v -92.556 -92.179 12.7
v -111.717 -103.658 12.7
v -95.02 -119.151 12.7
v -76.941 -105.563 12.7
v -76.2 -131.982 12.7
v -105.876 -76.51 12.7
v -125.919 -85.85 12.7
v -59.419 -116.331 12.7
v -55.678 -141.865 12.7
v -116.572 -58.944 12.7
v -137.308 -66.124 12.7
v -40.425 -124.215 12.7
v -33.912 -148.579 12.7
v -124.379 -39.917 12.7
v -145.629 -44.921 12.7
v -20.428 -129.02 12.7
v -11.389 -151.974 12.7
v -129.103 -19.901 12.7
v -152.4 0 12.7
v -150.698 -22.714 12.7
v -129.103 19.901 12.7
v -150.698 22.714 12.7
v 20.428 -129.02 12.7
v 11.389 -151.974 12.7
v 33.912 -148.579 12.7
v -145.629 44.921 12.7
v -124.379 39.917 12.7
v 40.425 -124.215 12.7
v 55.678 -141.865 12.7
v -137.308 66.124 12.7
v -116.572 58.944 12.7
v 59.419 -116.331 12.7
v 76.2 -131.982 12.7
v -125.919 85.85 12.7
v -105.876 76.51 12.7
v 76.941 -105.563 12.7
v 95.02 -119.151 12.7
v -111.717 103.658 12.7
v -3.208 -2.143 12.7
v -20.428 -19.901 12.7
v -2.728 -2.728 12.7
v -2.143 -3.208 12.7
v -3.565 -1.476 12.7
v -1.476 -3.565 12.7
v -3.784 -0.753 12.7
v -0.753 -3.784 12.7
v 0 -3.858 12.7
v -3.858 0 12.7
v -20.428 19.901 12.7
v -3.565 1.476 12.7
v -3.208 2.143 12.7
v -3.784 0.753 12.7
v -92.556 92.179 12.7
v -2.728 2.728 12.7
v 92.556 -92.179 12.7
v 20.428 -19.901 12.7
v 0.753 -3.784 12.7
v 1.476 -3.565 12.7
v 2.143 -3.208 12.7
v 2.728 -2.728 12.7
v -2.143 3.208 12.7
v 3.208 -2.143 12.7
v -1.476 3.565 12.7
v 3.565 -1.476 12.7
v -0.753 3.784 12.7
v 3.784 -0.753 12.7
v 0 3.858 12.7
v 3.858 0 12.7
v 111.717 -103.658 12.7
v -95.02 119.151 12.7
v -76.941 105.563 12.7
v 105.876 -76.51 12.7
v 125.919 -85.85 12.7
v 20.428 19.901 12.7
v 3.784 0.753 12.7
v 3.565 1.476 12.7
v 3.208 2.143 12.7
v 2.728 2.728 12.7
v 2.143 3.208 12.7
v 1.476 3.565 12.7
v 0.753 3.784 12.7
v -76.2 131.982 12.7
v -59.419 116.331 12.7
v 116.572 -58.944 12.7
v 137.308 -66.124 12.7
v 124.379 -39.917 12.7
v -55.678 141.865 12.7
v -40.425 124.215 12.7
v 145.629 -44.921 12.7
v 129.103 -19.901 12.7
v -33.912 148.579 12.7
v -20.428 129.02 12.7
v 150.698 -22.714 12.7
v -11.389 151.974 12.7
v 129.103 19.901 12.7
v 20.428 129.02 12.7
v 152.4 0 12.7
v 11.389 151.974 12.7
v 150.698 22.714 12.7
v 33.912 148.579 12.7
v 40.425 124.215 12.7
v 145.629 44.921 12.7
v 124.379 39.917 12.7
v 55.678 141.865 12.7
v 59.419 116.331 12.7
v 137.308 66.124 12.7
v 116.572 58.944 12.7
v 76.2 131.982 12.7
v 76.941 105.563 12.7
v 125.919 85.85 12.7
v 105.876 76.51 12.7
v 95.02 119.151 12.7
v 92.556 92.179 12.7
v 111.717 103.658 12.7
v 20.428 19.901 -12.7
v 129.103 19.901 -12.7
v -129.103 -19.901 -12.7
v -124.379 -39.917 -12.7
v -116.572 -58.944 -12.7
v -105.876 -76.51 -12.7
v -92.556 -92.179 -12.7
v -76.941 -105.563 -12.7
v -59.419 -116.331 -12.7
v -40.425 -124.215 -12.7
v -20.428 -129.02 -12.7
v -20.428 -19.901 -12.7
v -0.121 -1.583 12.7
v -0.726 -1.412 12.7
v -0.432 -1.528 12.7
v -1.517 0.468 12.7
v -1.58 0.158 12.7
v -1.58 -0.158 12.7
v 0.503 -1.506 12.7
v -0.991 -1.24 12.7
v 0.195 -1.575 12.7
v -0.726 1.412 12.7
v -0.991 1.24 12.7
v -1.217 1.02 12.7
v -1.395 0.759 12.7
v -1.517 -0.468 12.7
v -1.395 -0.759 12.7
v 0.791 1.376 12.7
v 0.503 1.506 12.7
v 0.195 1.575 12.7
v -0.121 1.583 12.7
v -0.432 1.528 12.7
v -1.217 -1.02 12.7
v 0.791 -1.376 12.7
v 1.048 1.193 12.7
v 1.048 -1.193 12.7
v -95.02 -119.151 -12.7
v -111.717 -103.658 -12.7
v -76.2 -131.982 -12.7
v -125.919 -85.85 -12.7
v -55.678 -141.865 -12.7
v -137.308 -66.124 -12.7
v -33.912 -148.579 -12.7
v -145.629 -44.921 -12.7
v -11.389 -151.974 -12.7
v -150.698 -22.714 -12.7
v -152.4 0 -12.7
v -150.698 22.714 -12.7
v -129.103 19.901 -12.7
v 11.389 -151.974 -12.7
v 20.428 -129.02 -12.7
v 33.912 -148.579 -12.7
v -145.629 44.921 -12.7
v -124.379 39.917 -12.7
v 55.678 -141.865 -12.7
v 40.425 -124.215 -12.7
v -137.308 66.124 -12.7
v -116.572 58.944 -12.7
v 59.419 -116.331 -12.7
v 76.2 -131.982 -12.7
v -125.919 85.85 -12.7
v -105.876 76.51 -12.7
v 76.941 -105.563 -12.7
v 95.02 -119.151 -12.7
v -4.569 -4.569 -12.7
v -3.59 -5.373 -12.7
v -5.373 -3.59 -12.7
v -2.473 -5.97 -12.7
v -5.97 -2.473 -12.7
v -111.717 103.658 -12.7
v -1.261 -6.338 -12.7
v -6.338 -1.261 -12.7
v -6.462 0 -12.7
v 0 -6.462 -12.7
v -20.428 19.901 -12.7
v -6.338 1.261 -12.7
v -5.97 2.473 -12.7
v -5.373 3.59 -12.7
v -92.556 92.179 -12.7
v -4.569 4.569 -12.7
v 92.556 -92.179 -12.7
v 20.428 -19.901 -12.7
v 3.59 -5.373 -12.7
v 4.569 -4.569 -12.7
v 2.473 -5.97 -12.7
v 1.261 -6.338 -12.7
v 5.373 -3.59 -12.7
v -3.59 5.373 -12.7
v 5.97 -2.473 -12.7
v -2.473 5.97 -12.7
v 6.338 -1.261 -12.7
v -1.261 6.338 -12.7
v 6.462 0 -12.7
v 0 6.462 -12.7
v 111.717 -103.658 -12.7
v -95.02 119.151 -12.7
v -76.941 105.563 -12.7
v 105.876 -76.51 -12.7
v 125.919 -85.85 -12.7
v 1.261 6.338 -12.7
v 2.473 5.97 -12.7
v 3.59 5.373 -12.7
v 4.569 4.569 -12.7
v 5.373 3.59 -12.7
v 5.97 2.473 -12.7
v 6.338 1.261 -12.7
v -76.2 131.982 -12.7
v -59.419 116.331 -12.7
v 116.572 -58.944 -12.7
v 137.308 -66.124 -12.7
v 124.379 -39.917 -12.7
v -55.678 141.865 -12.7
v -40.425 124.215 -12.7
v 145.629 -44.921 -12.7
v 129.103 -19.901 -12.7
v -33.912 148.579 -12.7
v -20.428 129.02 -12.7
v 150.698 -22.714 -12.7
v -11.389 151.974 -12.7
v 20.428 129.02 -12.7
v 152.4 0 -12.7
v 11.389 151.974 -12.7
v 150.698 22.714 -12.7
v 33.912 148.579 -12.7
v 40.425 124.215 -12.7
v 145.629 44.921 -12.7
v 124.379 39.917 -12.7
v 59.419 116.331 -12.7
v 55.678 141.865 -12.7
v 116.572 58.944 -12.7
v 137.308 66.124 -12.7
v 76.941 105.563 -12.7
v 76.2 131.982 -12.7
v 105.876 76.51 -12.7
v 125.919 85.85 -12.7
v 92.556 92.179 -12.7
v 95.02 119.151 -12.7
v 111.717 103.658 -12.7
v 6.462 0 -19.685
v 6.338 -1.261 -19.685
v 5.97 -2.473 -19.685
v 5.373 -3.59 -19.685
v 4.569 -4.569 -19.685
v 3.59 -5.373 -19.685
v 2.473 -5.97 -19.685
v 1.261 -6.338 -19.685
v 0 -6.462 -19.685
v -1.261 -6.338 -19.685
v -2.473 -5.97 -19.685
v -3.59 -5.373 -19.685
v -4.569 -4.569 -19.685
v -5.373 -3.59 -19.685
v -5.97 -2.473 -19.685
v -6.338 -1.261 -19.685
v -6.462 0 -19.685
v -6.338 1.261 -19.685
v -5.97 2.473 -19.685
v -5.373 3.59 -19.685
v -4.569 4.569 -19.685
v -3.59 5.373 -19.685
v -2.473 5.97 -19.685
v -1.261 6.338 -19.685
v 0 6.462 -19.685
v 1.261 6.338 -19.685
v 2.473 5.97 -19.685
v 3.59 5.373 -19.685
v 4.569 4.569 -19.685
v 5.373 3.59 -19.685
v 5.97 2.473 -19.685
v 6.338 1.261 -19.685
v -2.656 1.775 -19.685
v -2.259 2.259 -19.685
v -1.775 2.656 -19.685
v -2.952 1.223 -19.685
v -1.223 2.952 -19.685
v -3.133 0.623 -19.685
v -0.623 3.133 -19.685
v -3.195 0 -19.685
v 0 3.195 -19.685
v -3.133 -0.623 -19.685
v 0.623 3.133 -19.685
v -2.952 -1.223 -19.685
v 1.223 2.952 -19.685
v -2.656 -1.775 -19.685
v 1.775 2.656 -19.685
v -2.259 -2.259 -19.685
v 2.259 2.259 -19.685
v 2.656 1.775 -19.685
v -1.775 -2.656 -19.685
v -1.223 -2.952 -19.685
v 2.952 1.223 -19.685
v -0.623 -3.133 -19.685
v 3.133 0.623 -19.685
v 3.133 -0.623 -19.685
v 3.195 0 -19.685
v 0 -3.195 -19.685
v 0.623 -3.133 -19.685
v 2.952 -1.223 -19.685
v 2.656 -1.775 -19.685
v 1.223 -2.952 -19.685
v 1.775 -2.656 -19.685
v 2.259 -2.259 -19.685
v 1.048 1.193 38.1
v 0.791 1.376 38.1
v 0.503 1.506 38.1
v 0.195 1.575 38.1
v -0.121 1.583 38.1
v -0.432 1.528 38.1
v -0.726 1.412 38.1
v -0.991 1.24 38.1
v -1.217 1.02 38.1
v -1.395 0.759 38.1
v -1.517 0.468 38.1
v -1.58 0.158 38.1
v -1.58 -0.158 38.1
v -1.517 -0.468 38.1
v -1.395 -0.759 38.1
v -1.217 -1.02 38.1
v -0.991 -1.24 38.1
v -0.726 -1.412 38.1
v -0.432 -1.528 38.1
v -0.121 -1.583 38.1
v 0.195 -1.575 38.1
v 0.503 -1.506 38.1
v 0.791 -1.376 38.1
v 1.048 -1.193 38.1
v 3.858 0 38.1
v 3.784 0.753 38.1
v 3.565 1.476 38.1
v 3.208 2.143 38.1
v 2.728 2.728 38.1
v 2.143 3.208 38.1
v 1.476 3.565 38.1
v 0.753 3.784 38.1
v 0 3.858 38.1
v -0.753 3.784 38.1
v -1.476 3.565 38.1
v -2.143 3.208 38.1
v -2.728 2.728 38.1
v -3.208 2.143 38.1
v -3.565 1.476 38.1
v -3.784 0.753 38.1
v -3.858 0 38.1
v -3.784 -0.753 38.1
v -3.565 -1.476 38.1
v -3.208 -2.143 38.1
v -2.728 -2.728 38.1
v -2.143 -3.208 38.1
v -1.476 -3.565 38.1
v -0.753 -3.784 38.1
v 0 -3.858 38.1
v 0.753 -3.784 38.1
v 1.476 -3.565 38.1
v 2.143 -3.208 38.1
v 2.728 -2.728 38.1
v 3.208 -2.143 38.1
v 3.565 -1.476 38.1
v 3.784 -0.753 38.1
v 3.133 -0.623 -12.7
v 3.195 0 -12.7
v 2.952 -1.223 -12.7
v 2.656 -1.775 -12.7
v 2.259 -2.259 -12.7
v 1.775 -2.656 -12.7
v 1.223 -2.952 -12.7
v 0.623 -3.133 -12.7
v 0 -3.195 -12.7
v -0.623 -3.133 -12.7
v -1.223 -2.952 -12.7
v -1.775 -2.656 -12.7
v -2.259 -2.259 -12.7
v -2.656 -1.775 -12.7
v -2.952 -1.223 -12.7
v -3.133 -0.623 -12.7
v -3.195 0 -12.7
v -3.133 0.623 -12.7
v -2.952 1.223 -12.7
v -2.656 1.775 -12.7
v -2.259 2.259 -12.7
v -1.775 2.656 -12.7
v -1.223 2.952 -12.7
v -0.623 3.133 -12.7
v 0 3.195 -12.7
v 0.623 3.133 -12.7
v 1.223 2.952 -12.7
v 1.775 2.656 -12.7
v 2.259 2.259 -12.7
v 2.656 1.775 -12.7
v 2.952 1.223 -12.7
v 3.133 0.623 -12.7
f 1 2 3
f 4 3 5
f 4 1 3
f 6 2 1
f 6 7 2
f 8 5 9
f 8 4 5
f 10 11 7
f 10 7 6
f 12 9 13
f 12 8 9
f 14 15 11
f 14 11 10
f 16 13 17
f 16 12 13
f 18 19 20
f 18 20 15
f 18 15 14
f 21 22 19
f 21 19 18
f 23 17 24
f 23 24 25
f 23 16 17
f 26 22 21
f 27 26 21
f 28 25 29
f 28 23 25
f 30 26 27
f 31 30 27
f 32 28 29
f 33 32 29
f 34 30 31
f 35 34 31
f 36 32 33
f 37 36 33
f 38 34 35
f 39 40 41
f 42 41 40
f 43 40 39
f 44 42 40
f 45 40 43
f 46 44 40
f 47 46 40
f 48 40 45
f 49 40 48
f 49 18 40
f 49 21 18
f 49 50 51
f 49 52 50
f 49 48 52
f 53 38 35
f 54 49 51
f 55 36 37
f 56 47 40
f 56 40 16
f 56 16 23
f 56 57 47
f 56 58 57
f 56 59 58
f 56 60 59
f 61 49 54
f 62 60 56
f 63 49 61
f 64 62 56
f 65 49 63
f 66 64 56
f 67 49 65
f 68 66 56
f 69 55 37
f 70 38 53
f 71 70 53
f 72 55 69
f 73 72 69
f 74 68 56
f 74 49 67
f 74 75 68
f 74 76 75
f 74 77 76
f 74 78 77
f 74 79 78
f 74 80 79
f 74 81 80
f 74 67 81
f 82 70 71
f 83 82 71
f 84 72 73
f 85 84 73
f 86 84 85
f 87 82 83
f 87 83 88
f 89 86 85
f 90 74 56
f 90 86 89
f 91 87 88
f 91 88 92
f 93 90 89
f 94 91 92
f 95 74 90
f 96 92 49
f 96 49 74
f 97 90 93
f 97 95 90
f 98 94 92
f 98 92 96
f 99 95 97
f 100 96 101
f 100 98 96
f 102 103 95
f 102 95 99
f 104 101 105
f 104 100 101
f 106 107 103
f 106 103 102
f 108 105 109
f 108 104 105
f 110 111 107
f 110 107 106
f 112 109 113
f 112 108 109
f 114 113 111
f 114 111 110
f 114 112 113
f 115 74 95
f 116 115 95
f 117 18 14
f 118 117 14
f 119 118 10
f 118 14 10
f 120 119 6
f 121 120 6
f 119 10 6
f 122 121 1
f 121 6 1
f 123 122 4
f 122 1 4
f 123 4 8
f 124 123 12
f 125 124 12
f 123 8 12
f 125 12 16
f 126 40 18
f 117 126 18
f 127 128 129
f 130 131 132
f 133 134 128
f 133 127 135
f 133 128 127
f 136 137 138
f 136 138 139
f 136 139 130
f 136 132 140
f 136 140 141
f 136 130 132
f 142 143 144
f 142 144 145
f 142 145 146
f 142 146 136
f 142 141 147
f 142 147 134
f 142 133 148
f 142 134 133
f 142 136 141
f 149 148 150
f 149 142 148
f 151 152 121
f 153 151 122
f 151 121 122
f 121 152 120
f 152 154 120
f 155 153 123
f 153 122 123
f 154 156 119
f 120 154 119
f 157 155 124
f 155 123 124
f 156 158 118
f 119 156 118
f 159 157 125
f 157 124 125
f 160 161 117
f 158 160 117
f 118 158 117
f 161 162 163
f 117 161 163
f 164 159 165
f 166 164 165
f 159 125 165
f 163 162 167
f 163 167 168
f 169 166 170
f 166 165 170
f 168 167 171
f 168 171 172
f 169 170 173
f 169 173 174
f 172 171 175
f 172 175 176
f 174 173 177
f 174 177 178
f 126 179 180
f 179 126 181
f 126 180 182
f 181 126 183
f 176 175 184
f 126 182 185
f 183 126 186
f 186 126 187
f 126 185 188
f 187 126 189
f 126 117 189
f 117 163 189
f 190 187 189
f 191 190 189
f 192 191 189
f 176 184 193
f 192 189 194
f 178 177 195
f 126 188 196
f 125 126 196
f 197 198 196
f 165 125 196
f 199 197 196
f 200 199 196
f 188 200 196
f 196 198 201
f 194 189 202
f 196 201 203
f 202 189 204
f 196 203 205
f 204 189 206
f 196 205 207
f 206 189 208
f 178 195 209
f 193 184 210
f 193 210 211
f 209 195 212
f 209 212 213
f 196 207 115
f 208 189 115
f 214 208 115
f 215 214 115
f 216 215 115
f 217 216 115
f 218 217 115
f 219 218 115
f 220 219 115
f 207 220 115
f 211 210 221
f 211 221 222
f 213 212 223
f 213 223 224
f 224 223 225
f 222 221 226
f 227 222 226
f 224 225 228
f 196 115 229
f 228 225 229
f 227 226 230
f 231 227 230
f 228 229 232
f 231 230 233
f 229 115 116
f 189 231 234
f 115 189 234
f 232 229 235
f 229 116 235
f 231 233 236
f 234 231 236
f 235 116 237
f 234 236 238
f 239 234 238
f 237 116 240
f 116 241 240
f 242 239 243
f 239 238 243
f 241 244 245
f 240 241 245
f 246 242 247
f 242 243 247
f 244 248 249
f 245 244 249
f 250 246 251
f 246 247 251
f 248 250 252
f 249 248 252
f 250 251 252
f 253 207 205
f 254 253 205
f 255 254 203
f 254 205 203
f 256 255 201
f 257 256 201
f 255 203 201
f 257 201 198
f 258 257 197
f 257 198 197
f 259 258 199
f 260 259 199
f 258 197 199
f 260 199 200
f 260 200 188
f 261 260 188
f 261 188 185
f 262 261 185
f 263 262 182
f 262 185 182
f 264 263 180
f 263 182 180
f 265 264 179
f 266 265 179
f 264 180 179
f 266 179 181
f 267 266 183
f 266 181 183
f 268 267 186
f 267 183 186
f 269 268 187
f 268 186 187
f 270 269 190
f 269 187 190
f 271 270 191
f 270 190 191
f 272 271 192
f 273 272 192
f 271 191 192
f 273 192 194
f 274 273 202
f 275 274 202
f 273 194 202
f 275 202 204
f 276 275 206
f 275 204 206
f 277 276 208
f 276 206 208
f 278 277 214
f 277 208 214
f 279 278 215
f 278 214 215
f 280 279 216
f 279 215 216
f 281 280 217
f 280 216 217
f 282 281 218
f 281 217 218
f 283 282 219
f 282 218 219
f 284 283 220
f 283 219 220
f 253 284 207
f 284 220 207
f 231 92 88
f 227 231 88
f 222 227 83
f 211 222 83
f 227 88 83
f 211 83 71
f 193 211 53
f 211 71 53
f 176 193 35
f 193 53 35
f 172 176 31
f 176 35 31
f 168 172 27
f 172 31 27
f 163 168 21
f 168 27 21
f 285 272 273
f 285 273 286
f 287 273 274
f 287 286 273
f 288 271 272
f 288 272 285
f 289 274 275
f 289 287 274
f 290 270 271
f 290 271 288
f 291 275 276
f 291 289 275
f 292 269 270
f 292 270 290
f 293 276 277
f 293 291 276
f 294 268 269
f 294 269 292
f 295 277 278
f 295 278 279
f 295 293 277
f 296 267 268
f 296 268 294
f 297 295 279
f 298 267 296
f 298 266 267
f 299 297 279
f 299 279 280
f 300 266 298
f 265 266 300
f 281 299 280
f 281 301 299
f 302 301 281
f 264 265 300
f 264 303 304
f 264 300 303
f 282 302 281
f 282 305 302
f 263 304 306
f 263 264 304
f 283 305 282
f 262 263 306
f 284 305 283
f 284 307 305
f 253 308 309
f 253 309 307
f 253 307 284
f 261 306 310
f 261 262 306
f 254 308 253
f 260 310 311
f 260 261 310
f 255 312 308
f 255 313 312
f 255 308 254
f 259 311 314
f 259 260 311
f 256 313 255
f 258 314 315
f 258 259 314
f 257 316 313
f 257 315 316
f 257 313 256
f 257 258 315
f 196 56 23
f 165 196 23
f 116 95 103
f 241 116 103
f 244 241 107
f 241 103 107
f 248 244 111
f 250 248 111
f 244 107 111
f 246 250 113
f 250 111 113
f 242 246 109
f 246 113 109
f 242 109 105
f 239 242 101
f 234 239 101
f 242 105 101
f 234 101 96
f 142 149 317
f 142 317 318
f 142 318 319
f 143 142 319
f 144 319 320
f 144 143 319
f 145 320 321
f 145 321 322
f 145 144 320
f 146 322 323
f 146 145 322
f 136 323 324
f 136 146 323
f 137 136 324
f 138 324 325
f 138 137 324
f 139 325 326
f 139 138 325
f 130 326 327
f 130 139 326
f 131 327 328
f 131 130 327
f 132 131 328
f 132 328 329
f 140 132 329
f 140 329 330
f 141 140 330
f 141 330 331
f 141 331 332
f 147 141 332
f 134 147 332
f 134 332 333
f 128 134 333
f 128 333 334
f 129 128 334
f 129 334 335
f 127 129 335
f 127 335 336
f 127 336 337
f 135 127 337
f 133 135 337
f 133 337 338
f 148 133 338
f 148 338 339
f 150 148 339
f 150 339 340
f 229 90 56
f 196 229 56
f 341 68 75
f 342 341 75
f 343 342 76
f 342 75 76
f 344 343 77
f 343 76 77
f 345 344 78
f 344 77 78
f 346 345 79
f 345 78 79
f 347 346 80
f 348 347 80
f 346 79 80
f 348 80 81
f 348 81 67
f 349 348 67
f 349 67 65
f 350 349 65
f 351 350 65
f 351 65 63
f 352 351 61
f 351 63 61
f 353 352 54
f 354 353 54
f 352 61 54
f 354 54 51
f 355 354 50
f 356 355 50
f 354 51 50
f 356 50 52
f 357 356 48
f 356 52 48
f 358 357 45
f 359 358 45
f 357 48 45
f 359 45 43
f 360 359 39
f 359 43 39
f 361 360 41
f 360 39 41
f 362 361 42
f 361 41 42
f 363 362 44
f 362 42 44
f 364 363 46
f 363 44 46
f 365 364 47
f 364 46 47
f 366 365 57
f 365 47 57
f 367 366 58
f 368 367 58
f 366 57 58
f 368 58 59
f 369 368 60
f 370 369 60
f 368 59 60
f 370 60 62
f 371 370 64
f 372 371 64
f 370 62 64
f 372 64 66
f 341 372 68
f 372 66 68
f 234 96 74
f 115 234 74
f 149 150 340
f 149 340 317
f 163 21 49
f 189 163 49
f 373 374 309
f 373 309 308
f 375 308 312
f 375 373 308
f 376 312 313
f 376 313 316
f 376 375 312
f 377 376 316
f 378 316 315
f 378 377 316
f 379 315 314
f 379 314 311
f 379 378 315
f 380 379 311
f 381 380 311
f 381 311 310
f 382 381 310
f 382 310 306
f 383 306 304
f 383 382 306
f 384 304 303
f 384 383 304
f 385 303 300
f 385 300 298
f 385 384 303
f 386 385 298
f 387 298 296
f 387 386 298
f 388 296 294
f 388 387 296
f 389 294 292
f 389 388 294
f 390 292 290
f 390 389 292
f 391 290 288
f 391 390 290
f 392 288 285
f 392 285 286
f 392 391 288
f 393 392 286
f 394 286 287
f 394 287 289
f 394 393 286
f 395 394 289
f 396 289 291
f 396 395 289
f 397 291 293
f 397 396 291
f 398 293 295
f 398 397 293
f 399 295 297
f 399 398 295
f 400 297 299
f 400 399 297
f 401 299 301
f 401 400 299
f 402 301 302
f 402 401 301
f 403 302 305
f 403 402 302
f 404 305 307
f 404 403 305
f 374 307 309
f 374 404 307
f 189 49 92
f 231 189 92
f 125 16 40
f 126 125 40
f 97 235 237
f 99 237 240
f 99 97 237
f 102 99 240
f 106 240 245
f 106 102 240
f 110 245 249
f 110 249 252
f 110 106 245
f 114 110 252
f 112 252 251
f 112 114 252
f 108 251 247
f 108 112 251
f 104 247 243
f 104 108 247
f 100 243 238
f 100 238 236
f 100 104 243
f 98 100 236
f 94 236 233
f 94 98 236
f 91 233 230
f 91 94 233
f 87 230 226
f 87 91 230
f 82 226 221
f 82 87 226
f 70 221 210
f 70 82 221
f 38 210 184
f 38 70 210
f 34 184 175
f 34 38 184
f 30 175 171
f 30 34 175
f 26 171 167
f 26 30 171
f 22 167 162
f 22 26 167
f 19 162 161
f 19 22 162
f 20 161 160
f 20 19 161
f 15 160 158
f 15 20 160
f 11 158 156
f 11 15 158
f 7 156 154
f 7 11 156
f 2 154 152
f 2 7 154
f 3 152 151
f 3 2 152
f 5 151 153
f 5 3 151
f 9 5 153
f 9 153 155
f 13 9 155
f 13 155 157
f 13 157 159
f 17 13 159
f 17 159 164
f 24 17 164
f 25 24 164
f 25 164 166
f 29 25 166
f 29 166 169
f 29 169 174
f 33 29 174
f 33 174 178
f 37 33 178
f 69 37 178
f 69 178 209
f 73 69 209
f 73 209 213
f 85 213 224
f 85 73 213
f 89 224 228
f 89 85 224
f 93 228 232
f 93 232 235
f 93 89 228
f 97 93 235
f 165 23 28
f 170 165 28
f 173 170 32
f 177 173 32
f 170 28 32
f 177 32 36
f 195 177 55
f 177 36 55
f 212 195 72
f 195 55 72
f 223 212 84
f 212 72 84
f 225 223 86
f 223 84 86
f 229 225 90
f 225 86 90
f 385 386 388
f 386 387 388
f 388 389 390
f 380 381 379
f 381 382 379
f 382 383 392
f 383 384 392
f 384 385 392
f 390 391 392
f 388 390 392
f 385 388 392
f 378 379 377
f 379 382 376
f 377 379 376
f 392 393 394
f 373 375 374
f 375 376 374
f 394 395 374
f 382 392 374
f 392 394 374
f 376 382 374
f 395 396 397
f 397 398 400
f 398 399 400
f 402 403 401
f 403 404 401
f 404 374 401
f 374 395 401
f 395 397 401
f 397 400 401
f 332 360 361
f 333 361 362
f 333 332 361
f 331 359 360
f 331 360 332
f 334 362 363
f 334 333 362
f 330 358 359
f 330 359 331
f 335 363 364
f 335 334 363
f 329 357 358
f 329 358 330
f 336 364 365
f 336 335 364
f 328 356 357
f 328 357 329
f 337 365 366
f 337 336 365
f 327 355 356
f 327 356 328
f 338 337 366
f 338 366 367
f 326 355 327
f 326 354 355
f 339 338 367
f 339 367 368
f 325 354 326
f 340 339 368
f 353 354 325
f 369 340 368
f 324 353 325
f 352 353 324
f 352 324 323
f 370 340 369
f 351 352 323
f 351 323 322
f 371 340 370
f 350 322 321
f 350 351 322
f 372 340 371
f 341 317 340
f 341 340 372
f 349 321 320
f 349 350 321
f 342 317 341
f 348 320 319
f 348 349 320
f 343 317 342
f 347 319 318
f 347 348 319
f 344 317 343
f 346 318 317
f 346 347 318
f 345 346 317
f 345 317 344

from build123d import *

# Parameters (mm, degrees)
F0_R          = 152.4
F1_DEPTH      = 12.7
F1_DEPTH_BACK = 12.7
F2_R          = 3.858191
F2_R_2        = 1.5875
F3_DEPTH      = 25.4
F5_DEPTH      = 25.401
F6_W          = 0.887787
F6_H          = 5.147254
F7_DEPTH      = 25.4
F8_R          = 6.462154
F8_R_2        = 3.194713
F9_DEPTH      = 6.985


with BuildPart() as f1:
    # F0 (on Top) → F1 (new body, two sides)
    with BuildSketch(Plane.XY) as f1_sk:
        Circle(F0_R)
    extrude(amount=F1_DEPTH)
    extrude(f1_sk.sketch, amount=-F1_DEPTH_BACK)

    # F2 (on face) → F3 (join)
    with BuildSketch(Plane.XY.offset(12.7)):
        Circle(F2_R)
        Circle(F2_R_2, mode=Mode.SUBTRACT)
    extrude(amount=F3_DEPTH)

    # F4 (on face) → F5 (cut, through all)
    with BuildSketch(Plane.XY.offset(12.7)):
        with BuildLine():
            Line((-20.428086, -19.901165), (-129.102567, -19.901165))
            ThreePointArc((-129.102567, -19.901165), (-92.555914, -92.178804), (-20.428086, -129.02024))
            Line((-20.428086, -129.02024), (-20.428086, -19.901165))
        make_face()
        with BuildLine():
            Line((-129.102567, 19.901165), (-20.428086, 19.901165))
            Line((-20.428086, 19.901165), (-20.428086, 129.02024))
            ThreePointArc((-20.428086, 129.02024), (-92.555914, 92.178804), (-129.102567, 19.901165))
        make_face()
        with BuildLine():
            Line((20.428086, 129.02024), (20.428086, 19.901165))
            Line((20.428086, 19.901165), (129.102567, 19.901165))
            ThreePointArc((129.102567, 19.901165), (92.555914, 92.178804), (20.428086, 129.02024))
        make_face()
        with BuildLine():
            ThreePointArc((20.428086, -129.02024), (92.555914, -92.178804), (129.102567, -19.901165))
            Line((129.102567, -19.901165), (20.428086, -19.901165))
            Line((20.428086, -19.901165), (20.428086, -129.02024))
        make_face()
    extrude(amount=-F5_DEPTH, mode=Mode.SUBTRACT)

    # F6 (on face) → F7 (join)
    with BuildSketch(Plane.XY.offset(12.7)):
        with Locations((1.491769, -0.241479)):
            Rectangle(F6_W, F6_H)
    extrude(amount=F7_DEPTH)

    # F8 (on face) → F9 (join)
    with BuildSketch(Plane(origin=(0, 0, -12.7), x_dir=(1, 0, 0), z_dir=(0, 0, -1))):
        Circle(F8_R)
        Circle(F8_R_2, mode=Mode.SUBTRACT)
    extrude(amount=F9_DEPTH)


solid = f1.part
